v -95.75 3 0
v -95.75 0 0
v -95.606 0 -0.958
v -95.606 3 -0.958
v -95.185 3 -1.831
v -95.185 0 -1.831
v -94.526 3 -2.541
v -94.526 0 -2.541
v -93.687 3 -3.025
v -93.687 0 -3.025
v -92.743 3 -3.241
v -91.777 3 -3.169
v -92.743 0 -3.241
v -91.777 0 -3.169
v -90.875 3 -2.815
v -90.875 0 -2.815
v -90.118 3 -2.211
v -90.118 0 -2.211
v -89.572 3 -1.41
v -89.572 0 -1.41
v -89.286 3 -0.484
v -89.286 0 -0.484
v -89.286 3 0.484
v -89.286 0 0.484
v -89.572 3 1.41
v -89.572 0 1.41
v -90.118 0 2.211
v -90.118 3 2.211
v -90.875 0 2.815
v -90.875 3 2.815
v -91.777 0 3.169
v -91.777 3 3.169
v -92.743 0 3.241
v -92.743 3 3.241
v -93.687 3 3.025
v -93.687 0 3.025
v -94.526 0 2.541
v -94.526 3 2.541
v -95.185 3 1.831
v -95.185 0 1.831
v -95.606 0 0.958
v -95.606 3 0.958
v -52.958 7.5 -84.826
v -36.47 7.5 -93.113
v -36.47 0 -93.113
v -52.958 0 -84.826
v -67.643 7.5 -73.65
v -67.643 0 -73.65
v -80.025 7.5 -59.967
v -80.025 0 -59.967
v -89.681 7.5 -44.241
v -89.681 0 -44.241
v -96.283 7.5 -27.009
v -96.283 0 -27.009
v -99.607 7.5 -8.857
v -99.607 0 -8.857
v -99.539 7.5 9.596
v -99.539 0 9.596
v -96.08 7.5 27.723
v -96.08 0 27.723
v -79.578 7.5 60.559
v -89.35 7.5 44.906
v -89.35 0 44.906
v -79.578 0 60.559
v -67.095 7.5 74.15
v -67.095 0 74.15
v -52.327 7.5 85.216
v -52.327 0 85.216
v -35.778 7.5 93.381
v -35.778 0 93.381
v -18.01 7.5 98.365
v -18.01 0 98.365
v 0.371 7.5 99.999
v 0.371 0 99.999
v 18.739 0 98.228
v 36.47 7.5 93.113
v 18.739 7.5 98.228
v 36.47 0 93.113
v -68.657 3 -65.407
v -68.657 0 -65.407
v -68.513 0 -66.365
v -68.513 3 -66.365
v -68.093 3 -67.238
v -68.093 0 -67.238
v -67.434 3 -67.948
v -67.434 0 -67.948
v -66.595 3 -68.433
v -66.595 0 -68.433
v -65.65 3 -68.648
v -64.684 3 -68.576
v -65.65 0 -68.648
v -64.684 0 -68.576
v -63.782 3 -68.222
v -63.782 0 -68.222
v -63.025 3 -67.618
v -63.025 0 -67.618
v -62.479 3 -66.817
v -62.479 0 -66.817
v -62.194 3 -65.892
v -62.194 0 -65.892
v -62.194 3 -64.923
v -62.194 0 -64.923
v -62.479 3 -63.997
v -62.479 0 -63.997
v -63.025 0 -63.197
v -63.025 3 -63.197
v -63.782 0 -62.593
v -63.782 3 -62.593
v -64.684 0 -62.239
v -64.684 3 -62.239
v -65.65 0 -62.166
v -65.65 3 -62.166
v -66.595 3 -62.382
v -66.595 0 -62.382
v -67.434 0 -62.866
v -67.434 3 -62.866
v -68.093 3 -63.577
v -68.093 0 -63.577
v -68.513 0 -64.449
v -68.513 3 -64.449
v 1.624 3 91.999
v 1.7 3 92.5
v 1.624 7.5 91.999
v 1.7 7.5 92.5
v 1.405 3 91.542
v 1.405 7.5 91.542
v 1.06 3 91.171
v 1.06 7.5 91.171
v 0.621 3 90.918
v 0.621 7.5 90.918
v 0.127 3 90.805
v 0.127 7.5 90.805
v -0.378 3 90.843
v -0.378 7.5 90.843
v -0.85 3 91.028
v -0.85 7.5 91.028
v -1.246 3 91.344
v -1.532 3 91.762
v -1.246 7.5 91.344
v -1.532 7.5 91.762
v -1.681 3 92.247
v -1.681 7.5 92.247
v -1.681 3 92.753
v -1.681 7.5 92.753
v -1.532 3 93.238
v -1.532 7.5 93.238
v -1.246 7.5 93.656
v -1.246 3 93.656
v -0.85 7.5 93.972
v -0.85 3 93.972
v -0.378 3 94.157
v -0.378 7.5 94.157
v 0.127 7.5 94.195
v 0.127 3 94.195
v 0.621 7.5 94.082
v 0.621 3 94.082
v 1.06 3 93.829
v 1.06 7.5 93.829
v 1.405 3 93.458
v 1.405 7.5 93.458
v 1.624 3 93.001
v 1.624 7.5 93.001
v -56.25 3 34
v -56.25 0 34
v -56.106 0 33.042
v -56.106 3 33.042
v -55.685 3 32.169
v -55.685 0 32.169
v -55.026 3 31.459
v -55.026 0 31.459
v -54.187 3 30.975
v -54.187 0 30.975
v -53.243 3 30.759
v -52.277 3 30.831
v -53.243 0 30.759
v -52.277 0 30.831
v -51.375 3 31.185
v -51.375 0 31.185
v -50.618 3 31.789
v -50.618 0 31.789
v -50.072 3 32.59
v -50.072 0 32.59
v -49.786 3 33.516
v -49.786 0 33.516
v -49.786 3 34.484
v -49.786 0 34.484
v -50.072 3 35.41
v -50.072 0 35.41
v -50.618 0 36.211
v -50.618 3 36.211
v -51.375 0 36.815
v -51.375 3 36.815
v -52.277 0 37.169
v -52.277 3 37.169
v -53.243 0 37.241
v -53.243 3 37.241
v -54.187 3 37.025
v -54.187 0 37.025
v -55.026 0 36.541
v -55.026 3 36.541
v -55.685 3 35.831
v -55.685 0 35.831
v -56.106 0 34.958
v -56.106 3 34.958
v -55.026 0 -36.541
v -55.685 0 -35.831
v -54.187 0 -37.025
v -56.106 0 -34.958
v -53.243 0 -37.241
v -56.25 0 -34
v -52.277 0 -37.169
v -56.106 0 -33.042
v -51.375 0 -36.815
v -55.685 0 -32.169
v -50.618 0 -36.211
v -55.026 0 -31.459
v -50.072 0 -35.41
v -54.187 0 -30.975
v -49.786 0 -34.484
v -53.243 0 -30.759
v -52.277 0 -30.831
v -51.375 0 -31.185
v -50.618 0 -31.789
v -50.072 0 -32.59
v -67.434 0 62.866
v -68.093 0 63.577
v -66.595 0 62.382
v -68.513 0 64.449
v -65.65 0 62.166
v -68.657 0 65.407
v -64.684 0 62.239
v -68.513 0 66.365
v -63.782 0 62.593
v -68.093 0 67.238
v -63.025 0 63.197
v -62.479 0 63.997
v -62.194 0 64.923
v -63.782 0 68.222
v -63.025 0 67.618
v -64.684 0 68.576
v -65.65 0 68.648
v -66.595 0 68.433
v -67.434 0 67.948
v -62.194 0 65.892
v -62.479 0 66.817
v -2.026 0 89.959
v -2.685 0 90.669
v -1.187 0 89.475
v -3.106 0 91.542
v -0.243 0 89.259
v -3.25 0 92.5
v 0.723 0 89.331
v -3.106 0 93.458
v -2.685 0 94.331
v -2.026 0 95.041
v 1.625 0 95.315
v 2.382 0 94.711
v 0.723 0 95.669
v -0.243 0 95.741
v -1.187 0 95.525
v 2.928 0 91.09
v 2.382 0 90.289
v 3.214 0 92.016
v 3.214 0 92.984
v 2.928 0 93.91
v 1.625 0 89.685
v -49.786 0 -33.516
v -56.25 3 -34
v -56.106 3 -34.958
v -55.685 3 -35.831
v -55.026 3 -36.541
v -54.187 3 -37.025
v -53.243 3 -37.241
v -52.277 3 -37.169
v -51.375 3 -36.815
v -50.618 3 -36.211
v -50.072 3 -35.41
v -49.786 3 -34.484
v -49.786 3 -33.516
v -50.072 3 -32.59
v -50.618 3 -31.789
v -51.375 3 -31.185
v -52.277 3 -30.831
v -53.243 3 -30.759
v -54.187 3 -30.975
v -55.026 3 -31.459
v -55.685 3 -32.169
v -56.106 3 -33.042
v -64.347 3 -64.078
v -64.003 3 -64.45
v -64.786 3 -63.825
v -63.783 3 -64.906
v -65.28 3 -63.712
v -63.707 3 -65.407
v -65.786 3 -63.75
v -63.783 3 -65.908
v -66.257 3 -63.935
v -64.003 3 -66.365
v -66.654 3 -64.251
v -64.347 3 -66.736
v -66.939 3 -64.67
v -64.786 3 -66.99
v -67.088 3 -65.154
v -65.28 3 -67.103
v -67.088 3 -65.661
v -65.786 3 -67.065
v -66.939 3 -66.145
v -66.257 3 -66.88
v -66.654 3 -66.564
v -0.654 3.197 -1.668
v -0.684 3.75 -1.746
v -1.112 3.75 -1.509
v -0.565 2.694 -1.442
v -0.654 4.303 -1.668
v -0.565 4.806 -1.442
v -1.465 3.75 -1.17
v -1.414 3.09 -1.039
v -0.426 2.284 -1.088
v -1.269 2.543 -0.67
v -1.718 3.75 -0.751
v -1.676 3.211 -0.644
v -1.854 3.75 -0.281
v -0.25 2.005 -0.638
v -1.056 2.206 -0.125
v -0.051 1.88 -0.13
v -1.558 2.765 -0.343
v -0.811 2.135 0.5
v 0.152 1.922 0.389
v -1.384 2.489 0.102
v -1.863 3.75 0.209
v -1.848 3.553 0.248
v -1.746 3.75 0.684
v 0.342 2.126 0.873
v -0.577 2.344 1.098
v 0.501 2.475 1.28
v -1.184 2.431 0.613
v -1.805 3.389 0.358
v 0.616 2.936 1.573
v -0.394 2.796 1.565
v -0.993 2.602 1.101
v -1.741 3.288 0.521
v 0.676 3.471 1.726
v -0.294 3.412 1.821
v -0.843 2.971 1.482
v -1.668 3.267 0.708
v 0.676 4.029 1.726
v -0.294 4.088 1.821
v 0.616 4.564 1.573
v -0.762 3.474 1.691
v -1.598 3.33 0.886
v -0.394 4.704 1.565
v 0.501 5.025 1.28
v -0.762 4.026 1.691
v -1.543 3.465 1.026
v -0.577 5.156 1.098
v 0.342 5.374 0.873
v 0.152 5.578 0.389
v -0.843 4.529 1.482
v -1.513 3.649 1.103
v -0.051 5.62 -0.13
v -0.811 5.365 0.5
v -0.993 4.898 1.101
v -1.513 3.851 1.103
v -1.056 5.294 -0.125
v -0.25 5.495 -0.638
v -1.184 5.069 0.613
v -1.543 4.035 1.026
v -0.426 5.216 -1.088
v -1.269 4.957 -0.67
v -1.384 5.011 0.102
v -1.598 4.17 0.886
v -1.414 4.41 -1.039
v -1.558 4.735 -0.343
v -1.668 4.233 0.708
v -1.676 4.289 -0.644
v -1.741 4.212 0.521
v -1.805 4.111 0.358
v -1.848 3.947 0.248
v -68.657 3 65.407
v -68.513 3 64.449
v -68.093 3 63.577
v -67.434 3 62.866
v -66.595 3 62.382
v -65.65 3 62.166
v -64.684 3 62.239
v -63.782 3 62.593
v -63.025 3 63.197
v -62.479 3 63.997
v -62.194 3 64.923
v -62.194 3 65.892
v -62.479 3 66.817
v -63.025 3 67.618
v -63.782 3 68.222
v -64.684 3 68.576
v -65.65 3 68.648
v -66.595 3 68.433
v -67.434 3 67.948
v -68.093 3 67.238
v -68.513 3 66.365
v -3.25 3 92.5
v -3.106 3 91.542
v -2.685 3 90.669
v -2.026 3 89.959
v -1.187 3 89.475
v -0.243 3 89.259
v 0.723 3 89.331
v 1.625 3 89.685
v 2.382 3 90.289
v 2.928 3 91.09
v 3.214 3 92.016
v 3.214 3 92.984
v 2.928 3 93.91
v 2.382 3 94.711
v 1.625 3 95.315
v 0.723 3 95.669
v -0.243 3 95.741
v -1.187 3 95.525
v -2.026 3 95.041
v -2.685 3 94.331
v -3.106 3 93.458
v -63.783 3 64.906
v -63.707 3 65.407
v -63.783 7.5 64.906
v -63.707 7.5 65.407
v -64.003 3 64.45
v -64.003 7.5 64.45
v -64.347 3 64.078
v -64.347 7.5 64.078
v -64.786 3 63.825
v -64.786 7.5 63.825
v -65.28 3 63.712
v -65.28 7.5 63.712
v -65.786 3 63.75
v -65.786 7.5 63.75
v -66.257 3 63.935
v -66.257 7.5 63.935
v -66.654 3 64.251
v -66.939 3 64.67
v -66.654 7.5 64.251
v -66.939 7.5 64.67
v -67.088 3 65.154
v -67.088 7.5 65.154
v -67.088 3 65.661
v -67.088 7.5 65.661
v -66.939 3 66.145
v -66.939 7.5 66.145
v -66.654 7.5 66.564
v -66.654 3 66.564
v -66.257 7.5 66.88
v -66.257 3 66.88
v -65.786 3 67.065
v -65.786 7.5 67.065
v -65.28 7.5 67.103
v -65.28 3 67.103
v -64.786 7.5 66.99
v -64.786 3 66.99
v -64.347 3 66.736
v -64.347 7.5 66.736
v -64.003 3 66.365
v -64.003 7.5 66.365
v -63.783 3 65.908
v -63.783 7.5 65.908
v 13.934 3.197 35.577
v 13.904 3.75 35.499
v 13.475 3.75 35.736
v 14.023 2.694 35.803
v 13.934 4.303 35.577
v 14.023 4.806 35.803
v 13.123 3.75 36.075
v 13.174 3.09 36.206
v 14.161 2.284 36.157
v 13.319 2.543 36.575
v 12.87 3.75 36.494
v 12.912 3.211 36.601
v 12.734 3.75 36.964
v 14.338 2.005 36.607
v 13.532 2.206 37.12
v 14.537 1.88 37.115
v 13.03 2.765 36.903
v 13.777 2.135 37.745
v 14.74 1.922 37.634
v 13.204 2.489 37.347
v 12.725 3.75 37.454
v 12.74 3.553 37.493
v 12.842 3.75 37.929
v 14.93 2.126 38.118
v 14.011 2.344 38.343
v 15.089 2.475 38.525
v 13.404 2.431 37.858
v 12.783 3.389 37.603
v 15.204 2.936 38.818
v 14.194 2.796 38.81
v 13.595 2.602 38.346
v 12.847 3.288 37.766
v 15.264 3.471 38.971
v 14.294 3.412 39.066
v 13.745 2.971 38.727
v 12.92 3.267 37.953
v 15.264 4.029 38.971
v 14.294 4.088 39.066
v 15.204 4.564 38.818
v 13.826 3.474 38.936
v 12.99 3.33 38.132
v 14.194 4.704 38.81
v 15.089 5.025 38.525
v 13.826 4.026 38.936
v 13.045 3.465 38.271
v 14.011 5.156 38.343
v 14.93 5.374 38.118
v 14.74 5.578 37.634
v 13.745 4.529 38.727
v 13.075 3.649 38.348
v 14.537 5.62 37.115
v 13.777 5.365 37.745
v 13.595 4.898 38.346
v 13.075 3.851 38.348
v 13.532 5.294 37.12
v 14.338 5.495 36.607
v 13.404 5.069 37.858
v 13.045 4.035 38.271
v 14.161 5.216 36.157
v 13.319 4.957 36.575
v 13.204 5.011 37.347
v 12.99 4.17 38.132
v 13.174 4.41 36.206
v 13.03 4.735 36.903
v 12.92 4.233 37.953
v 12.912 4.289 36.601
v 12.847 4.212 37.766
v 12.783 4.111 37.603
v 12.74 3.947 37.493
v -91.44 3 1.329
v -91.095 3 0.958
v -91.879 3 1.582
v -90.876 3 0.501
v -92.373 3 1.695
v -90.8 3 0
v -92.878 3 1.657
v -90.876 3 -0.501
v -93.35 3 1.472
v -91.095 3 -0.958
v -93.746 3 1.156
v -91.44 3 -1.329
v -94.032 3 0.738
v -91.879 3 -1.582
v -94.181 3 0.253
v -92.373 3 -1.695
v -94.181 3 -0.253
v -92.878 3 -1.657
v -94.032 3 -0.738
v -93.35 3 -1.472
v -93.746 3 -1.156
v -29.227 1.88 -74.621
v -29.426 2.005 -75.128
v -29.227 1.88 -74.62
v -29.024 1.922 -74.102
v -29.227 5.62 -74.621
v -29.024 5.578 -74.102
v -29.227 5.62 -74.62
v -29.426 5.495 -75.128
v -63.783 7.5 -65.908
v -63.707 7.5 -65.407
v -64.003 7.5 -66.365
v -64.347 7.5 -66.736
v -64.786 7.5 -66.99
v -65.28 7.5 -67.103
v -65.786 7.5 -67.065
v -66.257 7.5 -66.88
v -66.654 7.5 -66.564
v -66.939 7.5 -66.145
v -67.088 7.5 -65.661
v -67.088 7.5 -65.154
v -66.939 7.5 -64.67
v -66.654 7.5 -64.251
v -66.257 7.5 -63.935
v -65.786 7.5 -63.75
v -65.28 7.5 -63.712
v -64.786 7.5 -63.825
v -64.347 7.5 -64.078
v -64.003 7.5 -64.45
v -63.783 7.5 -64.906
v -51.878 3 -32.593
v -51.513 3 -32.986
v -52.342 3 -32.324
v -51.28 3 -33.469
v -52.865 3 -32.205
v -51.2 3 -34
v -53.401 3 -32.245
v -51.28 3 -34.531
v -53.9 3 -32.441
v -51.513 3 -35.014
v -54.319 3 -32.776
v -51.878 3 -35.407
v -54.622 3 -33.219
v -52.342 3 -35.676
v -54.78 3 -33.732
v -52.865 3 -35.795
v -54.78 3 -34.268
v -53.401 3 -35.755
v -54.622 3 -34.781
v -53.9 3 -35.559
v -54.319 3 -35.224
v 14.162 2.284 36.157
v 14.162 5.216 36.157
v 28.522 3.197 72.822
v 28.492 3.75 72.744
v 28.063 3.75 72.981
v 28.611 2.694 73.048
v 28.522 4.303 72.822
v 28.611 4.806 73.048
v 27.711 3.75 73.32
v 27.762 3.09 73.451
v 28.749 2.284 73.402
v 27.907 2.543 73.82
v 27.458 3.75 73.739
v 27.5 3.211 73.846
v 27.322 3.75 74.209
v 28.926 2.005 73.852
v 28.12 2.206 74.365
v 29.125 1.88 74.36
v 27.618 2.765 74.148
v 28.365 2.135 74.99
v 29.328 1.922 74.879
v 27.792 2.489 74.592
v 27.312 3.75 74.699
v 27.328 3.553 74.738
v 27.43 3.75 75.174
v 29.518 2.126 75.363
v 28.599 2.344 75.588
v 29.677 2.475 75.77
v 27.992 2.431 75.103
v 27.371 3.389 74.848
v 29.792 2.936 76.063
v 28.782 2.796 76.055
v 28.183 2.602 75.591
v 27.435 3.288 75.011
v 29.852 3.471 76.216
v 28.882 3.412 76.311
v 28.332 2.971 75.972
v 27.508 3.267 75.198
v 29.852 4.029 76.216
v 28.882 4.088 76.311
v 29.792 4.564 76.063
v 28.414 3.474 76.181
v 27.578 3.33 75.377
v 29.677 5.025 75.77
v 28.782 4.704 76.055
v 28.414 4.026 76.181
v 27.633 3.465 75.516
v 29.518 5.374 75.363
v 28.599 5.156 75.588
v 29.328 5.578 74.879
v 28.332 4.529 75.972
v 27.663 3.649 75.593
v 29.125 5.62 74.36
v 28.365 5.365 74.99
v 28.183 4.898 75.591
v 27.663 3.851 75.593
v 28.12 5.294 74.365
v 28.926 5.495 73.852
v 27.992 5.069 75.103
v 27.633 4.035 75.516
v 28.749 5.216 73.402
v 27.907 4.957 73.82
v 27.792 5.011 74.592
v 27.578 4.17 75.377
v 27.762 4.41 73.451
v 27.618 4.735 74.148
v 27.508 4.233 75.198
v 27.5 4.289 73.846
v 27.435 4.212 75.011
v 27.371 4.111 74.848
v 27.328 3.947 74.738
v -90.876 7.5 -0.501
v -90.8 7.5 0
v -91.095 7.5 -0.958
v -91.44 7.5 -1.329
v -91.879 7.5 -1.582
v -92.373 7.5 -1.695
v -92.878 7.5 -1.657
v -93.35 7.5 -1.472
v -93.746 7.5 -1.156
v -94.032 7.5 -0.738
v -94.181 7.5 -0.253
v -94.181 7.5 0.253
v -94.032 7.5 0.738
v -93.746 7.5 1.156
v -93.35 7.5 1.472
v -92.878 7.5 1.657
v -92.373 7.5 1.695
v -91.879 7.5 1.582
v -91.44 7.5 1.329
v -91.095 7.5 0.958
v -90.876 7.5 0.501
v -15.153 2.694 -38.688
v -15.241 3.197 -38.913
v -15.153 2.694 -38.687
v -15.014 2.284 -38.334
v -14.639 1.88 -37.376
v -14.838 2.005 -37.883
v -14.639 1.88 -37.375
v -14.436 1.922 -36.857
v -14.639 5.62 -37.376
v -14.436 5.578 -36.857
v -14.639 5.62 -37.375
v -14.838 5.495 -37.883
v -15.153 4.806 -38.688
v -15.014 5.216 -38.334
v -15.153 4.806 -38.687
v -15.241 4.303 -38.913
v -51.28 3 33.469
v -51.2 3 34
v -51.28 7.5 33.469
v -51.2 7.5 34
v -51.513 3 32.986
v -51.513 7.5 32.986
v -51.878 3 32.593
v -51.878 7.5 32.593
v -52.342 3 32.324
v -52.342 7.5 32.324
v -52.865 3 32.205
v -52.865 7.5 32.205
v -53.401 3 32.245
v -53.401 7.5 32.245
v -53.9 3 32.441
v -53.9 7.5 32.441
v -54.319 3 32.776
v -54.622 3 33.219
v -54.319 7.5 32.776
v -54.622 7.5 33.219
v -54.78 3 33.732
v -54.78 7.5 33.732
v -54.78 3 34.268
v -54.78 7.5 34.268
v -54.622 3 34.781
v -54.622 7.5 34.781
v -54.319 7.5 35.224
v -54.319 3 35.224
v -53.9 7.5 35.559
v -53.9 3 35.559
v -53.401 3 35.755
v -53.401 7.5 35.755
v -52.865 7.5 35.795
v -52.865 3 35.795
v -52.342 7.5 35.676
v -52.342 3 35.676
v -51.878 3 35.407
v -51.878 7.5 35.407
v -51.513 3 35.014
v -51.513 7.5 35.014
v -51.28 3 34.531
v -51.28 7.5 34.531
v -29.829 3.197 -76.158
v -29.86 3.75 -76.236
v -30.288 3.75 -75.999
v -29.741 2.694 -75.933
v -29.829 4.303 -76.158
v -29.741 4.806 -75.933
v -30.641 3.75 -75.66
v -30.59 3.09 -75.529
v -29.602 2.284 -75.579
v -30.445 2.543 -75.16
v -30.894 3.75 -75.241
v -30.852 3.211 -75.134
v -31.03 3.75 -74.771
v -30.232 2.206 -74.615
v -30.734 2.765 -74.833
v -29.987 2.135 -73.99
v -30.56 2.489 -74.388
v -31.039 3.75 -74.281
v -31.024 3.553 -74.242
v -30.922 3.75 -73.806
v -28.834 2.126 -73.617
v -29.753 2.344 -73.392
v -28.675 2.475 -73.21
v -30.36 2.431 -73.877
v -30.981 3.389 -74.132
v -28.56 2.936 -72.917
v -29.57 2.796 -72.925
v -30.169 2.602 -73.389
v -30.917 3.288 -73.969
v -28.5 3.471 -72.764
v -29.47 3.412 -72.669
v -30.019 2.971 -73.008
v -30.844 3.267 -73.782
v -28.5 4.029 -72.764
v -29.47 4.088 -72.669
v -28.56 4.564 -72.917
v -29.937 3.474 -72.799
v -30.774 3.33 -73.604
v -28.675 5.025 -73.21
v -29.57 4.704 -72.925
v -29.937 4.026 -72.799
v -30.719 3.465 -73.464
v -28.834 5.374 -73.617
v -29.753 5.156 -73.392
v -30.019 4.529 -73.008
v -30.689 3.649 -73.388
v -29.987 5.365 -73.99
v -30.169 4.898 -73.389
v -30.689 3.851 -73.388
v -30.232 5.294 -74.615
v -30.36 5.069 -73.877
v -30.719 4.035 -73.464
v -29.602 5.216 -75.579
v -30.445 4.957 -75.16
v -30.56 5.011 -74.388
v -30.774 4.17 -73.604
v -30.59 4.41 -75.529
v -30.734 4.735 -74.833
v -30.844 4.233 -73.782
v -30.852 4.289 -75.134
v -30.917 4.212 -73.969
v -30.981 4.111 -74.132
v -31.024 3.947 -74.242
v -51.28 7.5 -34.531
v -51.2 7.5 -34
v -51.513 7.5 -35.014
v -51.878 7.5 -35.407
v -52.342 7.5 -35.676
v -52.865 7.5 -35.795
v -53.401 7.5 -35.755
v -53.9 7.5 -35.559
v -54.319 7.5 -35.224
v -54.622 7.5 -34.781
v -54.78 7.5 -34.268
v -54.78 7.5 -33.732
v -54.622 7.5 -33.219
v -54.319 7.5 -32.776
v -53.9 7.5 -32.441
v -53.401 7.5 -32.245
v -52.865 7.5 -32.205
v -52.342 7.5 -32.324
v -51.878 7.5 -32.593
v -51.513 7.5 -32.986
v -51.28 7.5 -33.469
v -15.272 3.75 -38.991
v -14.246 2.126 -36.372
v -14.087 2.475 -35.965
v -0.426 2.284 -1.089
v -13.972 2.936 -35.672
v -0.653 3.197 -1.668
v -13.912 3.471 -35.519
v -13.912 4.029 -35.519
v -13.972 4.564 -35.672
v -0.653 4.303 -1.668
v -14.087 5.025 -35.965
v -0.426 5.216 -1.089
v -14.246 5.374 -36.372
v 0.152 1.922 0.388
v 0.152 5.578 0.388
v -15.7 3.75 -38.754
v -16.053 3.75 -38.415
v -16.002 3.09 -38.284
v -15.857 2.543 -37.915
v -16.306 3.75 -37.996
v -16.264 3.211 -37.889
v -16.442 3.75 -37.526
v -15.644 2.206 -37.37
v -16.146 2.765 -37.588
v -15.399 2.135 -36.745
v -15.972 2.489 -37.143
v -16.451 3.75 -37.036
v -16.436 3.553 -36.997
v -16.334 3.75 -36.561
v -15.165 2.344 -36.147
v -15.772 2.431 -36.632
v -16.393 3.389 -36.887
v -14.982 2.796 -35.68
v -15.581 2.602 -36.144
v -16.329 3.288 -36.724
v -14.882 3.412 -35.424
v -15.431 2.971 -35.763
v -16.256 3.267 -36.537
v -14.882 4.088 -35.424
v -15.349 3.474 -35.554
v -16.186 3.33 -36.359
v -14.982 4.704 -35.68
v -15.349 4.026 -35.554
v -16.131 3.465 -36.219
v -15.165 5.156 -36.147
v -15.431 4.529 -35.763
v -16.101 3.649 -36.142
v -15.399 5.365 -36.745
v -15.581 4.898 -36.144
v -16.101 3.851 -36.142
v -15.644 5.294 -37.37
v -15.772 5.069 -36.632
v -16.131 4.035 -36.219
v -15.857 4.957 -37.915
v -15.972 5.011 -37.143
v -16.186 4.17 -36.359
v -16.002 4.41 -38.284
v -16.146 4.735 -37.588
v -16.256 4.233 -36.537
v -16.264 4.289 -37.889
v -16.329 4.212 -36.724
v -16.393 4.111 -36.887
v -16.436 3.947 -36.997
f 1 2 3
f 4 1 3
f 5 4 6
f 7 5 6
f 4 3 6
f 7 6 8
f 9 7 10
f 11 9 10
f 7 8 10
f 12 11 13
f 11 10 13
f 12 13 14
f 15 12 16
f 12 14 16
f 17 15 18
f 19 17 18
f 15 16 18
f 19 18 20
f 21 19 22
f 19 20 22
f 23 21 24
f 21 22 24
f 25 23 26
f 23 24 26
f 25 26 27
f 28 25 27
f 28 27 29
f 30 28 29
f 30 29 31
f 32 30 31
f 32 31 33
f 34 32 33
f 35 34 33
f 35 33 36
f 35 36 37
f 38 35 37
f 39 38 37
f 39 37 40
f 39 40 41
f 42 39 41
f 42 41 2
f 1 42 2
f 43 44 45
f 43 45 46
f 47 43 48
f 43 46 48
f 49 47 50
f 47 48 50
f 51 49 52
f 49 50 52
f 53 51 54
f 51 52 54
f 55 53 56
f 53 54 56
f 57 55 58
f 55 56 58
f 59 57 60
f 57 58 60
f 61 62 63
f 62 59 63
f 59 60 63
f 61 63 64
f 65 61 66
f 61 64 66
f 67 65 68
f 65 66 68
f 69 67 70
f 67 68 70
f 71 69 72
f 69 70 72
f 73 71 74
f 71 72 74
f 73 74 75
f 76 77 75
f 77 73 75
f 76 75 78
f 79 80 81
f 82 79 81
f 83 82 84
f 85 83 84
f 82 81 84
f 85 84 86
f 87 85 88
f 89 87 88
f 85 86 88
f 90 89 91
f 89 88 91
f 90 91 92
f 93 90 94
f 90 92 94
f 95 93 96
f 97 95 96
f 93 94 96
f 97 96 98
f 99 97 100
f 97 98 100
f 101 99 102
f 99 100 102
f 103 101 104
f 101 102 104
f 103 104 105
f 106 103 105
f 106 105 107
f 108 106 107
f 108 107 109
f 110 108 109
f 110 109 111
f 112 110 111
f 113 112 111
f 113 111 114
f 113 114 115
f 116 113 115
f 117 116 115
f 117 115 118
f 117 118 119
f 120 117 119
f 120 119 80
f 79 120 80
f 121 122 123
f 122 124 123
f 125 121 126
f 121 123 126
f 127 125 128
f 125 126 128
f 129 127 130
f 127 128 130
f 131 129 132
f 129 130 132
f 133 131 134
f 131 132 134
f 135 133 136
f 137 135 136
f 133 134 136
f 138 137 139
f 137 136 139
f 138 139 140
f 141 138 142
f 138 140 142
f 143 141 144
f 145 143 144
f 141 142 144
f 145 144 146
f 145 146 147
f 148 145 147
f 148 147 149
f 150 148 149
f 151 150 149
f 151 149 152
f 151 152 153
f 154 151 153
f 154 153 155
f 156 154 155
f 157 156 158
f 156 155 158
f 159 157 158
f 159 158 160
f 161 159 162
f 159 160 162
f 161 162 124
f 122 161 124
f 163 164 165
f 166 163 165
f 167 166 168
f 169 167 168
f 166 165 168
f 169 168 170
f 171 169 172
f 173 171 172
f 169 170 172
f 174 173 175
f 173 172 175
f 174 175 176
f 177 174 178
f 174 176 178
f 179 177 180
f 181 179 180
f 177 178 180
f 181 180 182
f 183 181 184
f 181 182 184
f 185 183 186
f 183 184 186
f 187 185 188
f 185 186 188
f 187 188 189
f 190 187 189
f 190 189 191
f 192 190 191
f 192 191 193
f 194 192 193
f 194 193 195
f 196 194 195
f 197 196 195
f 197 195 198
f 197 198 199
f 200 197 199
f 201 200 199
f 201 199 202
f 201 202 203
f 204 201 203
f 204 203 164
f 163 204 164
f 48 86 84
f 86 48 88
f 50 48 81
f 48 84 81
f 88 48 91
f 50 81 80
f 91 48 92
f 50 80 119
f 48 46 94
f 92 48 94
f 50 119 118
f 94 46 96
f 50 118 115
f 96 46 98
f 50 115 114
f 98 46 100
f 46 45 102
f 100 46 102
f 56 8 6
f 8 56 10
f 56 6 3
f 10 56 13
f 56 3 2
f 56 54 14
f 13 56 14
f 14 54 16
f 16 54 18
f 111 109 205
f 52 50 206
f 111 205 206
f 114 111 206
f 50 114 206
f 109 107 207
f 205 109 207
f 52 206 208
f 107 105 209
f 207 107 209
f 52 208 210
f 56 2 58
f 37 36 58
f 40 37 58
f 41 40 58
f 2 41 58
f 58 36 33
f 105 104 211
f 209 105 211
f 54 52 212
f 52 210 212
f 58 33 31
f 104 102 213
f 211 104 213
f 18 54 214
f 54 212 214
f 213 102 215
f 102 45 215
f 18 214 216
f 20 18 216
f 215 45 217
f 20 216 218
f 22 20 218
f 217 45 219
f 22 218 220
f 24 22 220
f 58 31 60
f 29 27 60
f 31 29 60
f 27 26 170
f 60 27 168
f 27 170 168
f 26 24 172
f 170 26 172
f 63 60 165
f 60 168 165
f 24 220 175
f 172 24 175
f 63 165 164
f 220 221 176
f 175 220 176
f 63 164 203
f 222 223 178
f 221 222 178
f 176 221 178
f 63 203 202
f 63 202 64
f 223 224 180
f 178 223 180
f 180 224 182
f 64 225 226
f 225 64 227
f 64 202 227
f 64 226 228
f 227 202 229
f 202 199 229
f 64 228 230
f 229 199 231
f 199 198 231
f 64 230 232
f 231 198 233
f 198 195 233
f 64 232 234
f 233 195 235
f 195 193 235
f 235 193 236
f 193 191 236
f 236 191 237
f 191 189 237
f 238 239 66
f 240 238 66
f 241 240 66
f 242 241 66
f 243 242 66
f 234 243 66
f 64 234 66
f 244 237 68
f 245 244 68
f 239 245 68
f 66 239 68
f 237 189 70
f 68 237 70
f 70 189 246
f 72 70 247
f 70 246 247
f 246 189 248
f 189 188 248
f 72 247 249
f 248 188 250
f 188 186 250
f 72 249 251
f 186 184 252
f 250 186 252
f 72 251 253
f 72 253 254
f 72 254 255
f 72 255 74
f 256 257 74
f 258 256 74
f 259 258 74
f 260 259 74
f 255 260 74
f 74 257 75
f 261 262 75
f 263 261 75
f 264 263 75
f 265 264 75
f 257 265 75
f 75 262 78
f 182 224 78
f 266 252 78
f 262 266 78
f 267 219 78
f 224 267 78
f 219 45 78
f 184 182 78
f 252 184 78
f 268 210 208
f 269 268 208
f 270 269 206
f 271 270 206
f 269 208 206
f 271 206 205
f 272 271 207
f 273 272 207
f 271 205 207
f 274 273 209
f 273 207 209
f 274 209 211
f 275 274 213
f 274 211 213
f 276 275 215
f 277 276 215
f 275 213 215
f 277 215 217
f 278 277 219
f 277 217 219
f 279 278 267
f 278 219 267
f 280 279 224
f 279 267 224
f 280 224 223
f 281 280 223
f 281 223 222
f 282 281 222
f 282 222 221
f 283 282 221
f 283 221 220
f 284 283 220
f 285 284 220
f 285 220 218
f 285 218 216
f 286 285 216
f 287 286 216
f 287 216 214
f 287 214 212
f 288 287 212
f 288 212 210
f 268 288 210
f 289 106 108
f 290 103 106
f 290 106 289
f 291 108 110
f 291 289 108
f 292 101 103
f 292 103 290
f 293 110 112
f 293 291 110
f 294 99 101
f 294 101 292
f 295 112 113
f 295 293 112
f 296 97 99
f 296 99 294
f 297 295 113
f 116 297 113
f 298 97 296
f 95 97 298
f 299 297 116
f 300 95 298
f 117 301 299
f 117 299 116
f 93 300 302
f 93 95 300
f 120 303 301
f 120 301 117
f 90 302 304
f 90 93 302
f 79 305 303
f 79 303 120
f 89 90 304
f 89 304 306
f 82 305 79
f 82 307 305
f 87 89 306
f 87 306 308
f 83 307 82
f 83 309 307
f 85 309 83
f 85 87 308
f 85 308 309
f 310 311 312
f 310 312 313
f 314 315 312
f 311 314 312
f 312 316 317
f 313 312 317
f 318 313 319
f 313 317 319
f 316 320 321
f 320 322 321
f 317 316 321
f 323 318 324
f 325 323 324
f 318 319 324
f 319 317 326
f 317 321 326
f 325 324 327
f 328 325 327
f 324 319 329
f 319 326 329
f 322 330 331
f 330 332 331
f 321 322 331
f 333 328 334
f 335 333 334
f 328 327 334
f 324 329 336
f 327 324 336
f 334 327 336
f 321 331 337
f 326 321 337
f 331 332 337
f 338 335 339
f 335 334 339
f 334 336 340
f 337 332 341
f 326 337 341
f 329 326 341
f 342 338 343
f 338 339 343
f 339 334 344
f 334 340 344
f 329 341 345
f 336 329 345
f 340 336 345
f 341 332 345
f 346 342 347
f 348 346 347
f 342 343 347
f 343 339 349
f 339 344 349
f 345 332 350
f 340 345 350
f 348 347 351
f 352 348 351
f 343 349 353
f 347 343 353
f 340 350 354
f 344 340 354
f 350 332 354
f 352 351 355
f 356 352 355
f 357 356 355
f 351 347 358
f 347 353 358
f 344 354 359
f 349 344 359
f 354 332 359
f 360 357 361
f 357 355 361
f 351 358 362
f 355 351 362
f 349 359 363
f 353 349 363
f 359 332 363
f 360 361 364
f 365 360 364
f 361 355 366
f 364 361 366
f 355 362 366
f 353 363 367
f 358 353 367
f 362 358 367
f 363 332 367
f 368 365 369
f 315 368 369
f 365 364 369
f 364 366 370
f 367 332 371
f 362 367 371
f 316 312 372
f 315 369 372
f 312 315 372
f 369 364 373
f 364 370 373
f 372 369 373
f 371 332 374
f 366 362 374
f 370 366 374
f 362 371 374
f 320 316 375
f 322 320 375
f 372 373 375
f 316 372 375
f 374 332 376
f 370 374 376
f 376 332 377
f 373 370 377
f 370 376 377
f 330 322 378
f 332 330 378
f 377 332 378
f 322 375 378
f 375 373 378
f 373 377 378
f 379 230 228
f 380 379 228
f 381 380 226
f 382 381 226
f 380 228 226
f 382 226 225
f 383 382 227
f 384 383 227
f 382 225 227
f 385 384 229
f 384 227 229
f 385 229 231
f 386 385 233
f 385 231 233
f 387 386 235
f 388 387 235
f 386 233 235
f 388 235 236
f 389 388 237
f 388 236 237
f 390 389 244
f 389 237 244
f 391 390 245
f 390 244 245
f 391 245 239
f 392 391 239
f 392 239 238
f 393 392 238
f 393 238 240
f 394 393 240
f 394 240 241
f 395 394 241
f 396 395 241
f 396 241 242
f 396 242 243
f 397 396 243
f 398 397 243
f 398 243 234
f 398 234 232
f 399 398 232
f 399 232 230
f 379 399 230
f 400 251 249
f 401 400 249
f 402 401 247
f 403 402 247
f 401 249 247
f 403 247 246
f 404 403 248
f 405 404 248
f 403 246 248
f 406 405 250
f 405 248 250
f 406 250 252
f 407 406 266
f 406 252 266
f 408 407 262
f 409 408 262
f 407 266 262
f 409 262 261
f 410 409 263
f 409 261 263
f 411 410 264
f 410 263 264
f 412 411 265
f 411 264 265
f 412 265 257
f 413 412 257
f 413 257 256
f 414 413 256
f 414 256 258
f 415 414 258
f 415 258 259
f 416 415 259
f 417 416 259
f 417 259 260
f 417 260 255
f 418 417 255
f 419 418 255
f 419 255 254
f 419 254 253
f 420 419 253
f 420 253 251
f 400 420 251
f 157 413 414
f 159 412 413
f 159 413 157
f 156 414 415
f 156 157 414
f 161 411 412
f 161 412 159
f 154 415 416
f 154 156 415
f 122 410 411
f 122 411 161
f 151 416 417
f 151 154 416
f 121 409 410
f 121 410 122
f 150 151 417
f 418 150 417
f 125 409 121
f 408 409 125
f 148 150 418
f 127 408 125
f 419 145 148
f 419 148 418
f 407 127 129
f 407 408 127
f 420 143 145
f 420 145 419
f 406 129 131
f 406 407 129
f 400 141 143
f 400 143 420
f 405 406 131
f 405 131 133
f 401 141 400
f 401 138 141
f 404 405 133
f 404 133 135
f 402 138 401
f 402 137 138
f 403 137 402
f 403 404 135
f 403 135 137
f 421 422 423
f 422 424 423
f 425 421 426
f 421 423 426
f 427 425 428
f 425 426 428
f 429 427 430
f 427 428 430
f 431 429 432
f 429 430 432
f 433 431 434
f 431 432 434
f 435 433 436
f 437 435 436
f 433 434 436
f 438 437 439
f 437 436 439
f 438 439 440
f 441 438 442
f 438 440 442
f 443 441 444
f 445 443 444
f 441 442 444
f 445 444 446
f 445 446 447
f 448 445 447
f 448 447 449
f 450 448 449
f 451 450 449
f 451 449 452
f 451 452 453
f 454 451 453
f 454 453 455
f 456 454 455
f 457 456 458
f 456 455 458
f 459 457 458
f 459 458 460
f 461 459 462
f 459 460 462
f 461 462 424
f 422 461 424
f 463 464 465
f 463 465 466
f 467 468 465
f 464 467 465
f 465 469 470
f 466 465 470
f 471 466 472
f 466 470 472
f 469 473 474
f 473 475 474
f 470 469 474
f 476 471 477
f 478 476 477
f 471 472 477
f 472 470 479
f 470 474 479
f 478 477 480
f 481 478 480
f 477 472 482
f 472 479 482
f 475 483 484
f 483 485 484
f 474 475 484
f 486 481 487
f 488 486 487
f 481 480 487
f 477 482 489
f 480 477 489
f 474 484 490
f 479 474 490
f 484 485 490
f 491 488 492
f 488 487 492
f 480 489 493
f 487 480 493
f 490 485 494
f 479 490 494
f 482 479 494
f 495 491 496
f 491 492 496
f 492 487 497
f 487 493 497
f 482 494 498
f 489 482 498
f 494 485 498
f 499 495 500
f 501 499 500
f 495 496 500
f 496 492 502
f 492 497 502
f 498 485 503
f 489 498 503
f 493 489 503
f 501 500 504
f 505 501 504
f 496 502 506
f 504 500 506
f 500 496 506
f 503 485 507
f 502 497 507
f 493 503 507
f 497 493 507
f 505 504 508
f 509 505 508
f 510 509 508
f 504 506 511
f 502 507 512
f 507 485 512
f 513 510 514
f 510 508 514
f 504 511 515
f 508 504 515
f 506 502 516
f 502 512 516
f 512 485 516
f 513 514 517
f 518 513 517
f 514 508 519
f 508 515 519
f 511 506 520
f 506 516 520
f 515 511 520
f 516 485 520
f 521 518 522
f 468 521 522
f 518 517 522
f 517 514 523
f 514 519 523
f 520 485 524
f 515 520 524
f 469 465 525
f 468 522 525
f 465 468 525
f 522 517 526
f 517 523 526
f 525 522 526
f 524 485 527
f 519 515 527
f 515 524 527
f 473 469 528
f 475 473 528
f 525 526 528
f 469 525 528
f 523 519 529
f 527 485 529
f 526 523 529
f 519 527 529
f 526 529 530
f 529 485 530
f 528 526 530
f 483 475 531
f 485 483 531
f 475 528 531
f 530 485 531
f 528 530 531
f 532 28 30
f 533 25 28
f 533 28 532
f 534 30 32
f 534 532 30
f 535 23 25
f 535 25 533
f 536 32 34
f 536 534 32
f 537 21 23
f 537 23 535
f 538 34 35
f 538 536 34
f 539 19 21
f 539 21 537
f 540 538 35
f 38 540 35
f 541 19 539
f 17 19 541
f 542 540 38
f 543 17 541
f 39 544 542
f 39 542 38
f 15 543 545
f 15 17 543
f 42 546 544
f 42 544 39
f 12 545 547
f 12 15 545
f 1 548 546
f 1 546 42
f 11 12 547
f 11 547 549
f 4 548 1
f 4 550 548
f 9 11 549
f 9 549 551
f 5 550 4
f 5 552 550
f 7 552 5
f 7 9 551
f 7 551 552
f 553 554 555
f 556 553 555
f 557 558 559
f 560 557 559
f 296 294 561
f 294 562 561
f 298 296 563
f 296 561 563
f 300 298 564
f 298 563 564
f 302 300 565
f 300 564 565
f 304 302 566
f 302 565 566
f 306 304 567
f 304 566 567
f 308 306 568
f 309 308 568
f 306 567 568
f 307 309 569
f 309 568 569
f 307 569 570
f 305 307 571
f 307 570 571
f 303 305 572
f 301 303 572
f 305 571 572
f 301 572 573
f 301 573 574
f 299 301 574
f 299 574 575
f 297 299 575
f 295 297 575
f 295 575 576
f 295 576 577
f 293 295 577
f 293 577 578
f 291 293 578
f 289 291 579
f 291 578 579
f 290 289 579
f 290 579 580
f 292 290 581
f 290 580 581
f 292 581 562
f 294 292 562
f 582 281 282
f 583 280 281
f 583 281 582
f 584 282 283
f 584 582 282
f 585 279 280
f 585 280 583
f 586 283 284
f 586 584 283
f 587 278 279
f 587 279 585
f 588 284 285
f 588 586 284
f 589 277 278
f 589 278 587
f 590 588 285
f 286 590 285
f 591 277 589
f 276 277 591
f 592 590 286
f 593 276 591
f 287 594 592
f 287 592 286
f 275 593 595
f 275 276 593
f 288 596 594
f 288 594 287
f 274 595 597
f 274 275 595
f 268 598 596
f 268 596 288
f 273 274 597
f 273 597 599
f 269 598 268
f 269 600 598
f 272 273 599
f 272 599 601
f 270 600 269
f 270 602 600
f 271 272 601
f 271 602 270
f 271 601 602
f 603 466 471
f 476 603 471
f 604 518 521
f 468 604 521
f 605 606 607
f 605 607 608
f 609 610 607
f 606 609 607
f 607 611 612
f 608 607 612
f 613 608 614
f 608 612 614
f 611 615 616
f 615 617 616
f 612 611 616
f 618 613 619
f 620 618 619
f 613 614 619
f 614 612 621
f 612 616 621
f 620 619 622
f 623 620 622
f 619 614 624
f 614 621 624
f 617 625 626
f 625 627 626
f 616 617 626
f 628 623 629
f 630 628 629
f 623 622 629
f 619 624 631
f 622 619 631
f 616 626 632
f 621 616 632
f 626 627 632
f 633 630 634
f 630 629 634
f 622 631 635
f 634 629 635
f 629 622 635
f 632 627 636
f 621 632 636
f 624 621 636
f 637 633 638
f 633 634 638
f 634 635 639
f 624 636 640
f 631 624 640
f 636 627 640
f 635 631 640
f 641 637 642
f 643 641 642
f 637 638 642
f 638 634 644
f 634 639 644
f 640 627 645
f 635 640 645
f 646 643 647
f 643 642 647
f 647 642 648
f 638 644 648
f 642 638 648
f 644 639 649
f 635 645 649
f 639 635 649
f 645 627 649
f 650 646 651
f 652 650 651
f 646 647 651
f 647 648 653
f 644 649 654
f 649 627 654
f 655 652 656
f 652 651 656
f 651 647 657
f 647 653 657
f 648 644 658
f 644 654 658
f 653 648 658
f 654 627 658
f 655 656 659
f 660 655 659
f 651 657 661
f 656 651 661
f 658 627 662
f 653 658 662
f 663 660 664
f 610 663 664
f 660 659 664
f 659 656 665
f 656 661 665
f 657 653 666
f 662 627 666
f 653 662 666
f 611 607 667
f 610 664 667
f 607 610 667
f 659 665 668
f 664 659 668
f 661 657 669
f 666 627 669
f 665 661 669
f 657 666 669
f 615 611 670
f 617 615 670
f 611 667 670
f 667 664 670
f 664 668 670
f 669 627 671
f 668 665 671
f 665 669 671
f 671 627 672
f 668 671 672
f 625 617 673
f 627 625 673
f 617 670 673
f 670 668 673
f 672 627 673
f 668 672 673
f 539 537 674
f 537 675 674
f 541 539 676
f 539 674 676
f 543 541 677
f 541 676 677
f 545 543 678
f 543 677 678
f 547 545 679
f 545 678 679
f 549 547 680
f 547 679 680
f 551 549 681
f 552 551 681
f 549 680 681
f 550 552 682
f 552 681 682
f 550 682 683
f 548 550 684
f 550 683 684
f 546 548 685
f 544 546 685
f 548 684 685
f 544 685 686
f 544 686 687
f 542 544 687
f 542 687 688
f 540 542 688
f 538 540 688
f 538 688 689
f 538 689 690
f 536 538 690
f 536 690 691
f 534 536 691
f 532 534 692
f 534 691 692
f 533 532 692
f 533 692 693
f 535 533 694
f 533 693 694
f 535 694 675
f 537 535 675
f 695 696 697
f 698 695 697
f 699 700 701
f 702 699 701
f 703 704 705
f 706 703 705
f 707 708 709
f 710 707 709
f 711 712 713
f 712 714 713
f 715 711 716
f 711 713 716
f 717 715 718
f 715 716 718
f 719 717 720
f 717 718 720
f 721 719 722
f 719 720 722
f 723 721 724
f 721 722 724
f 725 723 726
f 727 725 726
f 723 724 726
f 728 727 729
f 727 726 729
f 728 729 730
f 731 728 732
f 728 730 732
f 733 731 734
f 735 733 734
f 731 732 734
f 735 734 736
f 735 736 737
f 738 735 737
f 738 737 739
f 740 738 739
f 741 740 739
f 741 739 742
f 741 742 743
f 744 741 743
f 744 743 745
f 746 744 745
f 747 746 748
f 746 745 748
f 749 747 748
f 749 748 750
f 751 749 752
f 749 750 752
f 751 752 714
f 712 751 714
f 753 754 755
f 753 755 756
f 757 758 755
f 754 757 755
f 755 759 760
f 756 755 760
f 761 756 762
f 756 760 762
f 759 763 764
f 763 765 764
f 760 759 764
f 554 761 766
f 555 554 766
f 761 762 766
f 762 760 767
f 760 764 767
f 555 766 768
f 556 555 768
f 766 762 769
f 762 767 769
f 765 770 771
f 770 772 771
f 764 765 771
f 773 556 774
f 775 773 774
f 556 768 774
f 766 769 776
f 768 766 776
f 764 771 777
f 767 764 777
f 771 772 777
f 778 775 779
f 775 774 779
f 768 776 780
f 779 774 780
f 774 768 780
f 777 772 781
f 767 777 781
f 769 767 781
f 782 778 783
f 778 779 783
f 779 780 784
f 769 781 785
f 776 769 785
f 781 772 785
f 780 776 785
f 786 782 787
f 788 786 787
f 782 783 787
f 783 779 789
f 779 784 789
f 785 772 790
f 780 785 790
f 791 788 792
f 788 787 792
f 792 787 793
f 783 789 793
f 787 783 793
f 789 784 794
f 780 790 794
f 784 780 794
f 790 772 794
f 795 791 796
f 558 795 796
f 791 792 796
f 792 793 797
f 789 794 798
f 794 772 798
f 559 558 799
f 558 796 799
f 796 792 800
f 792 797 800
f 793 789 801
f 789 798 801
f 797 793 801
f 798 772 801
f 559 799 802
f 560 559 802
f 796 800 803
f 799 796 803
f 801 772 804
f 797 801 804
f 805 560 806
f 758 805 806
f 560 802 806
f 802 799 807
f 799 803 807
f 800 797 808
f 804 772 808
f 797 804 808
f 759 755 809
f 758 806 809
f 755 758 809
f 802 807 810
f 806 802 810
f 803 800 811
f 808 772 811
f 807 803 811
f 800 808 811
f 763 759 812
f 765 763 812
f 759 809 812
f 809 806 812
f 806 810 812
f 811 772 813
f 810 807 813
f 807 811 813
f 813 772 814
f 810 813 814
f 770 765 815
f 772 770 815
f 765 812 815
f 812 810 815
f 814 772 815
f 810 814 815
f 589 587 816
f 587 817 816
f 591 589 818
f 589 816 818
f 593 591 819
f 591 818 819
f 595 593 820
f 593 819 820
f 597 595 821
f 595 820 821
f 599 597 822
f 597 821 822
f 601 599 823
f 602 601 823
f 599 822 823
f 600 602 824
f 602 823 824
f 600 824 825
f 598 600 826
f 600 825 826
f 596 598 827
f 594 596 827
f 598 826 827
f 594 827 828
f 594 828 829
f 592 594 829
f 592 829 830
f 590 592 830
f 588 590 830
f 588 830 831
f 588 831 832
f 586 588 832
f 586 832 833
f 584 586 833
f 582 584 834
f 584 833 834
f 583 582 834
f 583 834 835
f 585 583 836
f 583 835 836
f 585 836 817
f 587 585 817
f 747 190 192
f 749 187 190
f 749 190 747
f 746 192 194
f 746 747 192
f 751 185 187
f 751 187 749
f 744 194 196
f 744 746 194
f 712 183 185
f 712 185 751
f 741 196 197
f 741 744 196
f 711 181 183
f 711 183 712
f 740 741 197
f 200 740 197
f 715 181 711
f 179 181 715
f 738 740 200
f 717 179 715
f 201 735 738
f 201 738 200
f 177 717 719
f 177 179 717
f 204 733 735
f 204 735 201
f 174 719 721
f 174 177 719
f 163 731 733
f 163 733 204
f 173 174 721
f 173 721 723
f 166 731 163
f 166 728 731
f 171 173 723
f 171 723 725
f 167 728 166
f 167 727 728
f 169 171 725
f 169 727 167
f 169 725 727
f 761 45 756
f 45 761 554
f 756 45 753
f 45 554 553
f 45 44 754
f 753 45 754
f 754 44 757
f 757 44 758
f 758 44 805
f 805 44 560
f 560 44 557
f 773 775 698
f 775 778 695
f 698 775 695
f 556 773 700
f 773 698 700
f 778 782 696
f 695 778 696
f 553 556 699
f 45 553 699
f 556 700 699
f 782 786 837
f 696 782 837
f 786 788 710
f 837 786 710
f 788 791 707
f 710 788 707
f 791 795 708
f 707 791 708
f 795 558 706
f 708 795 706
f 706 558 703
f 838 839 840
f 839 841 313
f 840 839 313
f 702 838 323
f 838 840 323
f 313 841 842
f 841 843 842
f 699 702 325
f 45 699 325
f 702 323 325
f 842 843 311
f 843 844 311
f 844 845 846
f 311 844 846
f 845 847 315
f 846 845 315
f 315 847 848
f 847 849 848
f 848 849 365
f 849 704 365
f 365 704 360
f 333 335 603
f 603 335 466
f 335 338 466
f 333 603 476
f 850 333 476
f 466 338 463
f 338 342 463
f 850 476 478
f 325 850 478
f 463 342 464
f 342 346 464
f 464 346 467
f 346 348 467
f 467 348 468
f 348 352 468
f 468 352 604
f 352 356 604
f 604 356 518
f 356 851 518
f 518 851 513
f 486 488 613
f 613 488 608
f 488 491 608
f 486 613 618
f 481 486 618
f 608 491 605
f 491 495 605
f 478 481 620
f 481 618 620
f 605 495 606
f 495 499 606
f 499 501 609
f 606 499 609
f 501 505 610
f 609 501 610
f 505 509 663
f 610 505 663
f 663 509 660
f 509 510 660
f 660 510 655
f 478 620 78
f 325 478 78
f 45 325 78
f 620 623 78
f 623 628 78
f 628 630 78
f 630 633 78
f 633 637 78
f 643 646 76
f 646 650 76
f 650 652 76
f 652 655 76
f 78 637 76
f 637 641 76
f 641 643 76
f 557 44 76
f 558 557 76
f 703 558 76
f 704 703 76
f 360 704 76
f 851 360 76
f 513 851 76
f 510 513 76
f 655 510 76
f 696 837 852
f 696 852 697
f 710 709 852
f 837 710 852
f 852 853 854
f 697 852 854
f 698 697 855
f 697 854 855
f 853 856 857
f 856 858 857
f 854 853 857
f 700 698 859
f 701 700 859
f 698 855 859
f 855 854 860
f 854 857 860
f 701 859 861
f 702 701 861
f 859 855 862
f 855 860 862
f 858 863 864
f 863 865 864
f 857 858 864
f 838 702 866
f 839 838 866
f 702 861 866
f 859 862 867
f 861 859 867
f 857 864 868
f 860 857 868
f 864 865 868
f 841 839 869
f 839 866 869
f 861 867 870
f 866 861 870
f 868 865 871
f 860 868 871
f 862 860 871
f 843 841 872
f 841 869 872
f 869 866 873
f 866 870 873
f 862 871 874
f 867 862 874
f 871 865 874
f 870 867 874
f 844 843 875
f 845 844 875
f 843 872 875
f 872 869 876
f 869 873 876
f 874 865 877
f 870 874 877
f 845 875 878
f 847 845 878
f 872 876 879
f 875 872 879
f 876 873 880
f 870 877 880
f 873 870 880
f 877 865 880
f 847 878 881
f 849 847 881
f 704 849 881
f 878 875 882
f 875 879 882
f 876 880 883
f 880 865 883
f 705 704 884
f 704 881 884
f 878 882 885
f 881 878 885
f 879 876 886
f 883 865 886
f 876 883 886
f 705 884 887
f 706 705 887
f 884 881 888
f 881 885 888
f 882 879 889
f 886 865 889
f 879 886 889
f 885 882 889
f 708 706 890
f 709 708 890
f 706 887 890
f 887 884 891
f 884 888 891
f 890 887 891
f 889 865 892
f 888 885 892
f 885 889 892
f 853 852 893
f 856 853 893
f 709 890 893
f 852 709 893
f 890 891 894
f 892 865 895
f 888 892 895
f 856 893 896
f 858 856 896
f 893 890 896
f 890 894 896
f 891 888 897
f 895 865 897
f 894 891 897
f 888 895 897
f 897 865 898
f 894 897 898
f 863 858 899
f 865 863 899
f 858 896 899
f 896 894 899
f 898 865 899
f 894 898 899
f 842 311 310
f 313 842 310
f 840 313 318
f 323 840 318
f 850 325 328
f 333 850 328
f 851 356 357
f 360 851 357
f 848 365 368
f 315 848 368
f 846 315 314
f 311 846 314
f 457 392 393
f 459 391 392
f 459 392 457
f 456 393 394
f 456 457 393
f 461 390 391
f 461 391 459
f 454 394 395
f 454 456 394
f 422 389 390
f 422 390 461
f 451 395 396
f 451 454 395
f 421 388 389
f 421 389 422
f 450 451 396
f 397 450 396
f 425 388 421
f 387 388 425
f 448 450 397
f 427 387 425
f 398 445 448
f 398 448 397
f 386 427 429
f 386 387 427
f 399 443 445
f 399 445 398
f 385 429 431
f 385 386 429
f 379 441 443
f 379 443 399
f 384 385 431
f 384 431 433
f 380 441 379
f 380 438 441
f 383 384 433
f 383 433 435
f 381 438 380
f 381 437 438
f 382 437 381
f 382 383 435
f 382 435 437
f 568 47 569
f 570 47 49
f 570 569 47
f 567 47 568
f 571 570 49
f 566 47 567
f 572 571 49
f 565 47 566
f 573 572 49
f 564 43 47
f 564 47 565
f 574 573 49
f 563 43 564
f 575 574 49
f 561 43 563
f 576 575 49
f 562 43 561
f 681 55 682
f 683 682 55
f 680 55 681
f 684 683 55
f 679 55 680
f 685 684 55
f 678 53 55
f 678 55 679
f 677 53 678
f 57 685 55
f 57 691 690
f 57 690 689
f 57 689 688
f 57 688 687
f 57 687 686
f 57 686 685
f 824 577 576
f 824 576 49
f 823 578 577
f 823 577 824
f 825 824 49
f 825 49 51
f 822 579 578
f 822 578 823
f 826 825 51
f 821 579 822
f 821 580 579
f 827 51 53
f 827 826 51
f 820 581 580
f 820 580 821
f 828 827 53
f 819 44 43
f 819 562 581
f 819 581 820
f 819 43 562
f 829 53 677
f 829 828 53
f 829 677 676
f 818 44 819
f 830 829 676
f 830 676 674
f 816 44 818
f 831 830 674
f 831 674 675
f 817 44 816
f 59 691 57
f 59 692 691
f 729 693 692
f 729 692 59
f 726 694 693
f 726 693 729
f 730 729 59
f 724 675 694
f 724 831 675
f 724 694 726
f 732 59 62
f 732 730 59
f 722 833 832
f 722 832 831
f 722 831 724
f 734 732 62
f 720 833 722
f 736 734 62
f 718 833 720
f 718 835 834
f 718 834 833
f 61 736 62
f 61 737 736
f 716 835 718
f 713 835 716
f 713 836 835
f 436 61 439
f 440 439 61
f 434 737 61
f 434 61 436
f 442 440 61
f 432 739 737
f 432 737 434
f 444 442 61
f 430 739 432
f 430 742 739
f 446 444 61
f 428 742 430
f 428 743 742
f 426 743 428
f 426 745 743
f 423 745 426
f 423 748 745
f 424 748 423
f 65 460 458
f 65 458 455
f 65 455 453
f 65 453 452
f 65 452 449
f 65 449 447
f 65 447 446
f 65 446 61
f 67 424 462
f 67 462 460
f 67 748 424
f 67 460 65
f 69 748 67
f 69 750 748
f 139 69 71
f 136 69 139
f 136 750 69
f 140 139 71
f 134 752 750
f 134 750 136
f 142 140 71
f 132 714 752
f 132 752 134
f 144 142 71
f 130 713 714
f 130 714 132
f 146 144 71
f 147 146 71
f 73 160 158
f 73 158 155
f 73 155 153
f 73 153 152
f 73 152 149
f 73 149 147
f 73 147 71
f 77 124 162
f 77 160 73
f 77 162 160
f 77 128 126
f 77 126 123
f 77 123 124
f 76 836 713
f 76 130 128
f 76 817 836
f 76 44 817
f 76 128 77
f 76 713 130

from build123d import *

# Parameters (mm, degrees)
SKETCH1_R                      = 100
BOSS_EXTRUDE1_DEPTH            = 7.5
CBORE_FOR_M3_SHCS1_D           = 3.4
CBORE_FOR_M3_SHCS1_DEPTH       = 7.5
CBORE_FOR_M3_SHCS1_CBORE_D     = 6.5
CBORE_FOR_M3_SHCS1_CBORE_DEPTH = 3
CBORE_FOR_M3_SHCS1_TIP         = 1.021463052
CBORE_FOR_M3_SHCS2_D           = 3.6
CBORE_FOR_M3_SHCS2_DEPTH       = 7.5
CBORE_FOR_M3_SHCS2_CBORE_D     = 6.5
CBORE_FOR_M3_SHCS2_CBORE_DEPTH = 3
CBORE_FOR_M3_SHCS2_TIP         = 1.081549114
SKETCH9_W                      = 276.839915284
SKETCH9_H                      = 86.454597136
CUT_EXTRUDE1_DEPTH             = 142.620090383
SKETCH10_R                     = 1.875
CUT_EXTRUDE2_DEPTH             = 1.875
FILLET1_R                      = 1.875


with BuildPart() as part:
    # Sketch1 → Boss-Extrude1 (new body)
    with BuildSketch(Plane(origin=(0, 0, 0), x_dir=(1, 0, 0), z_dir=(0, 1, 0))):
        with Locations(Location((0, 0, 0), (0, 0, 270))):
            Circle(SKETCH1_R)
    extrude(amount=BOSS_EXTRUDE1_DEPTH)

    # CBORE for M3 SHCS1
    with Locations(Plane(origin=(0, 0, 0), x_dir=(-1, 0, 0), z_dir=(0, -1, 0))):
        with Locations((0, -92.5), (-65.40737726, -65.40737726), (-92.5, 0), (-65.40737726, 65.40737726), (0, 92.5), (65.40737726, 65.40737726), (92.5, 0), (65.40737726, -65.40737726)):
            CounterBoreHole(CBORE_FOR_M3_SHCS1_D / 2, CBORE_FOR_M3_SHCS1_CBORE_D / 2, CBORE_FOR_M3_SHCS1_CBORE_DEPTH, depth=CBORE_FOR_M3_SHCS1_DEPTH)
            with Locations((0, 0, -(CBORE_FOR_M3_SHCS1_DEPTH + CBORE_FOR_M3_SHCS1_TIP / 2))):  # 118° drill point
                Cone(0, CBORE_FOR_M3_SHCS1_D / 2, CBORE_FOR_M3_SHCS1_TIP, mode=Mode.SUBTRACT)

    # CBORE for M3 SHCS2
    with Locations(Plane(origin=(0, 0, 0), x_dir=(-1, 0, 0), z_dir=(0, -1, 0))):
        with Locations((-53, 34), (53, 34), (53, -34), (-53, -34)):
            CounterBoreHole(CBORE_FOR_M3_SHCS2_D / 2, CBORE_FOR_M3_SHCS2_CBORE_D / 2, CBORE_FOR_M3_SHCS2_CBORE_DEPTH, depth=CBORE_FOR_M3_SHCS2_DEPTH)
            with Locations((0, 0, -(CBORE_FOR_M3_SHCS2_DEPTH + CBORE_FOR_M3_SHCS2_TIP / 2))):  # 118° drill point
                Cone(0, CBORE_FOR_M3_SHCS2_D / 2, CBORE_FOR_M3_SHCS2_TIP, mode=Mode.SUBTRACT)

    # Sketch9 → Cut-Extrude1 (cut, through all)
    with BuildSketch(Plane(origin=(0, 0, 0), x_dir=(0.3646980843717534, 0, 0.9311258278318637), z_dir=(-0.9311258278318637, 0, 0.3646980843717534))):
        with Locations((-1.022117504, -7.168579764)):
            Rectangle(SKETCH9_W, SKETCH9_H)
    extrude(amount=-CUT_EXTRUDE1_DEPTH, mode=Mode.SUBTRACT)

    # Sketch10 → Cut-Extrude2 (cut)
    with BuildSketch(Plane(origin=(0, 0, 0), x_dir=(0.3646980843717534, 0, 0.9311258278318637), z_dir=(-0.9311258278318637, 0, 0.3646980843717534))):
        with Locations(Location((0, 3.75, 0), (0, 0, 180))):
            Circle(SKETCH10_R)
        with Locations(Location((-40, 3.75, 0), (0, 0, 180))):
            Circle(SKETCH10_R)
        with Locations(Location((-80, 3.75, 0), (0, 0, 180))):
            Circle(SKETCH10_R)
        with Locations(Location((80, 3.75, 0), (0, 0, 180))):
            Circle(SKETCH10_R)
        with Locations(Location((40, 3.75, 0), (0, 0, 180))):
            Circle(SKETCH10_R)
    extrude(amount=CUT_EXTRUDE2_DEPTH, mode=Mode.SUBTRACT)

    # Fillet1
    fillet1_edges = [part.edges().sort_by_distance(p)[0] for p in [
        (-1.062052019, 3.75, 2.429669835),
        (-15.649975394, 3.75, -34.815363278),
        (-30.237898769, 3.75, -72.060396391),
        (28.113794731, 3.75, 76.919736062),
        (13.525871356, 3.75, 39.674702949),
    ]]
    fillet(fillet1_edges, radius=FILLET1_R - 0.0001)  # a hair under: the kernel refuses the full size


solid = part.part
